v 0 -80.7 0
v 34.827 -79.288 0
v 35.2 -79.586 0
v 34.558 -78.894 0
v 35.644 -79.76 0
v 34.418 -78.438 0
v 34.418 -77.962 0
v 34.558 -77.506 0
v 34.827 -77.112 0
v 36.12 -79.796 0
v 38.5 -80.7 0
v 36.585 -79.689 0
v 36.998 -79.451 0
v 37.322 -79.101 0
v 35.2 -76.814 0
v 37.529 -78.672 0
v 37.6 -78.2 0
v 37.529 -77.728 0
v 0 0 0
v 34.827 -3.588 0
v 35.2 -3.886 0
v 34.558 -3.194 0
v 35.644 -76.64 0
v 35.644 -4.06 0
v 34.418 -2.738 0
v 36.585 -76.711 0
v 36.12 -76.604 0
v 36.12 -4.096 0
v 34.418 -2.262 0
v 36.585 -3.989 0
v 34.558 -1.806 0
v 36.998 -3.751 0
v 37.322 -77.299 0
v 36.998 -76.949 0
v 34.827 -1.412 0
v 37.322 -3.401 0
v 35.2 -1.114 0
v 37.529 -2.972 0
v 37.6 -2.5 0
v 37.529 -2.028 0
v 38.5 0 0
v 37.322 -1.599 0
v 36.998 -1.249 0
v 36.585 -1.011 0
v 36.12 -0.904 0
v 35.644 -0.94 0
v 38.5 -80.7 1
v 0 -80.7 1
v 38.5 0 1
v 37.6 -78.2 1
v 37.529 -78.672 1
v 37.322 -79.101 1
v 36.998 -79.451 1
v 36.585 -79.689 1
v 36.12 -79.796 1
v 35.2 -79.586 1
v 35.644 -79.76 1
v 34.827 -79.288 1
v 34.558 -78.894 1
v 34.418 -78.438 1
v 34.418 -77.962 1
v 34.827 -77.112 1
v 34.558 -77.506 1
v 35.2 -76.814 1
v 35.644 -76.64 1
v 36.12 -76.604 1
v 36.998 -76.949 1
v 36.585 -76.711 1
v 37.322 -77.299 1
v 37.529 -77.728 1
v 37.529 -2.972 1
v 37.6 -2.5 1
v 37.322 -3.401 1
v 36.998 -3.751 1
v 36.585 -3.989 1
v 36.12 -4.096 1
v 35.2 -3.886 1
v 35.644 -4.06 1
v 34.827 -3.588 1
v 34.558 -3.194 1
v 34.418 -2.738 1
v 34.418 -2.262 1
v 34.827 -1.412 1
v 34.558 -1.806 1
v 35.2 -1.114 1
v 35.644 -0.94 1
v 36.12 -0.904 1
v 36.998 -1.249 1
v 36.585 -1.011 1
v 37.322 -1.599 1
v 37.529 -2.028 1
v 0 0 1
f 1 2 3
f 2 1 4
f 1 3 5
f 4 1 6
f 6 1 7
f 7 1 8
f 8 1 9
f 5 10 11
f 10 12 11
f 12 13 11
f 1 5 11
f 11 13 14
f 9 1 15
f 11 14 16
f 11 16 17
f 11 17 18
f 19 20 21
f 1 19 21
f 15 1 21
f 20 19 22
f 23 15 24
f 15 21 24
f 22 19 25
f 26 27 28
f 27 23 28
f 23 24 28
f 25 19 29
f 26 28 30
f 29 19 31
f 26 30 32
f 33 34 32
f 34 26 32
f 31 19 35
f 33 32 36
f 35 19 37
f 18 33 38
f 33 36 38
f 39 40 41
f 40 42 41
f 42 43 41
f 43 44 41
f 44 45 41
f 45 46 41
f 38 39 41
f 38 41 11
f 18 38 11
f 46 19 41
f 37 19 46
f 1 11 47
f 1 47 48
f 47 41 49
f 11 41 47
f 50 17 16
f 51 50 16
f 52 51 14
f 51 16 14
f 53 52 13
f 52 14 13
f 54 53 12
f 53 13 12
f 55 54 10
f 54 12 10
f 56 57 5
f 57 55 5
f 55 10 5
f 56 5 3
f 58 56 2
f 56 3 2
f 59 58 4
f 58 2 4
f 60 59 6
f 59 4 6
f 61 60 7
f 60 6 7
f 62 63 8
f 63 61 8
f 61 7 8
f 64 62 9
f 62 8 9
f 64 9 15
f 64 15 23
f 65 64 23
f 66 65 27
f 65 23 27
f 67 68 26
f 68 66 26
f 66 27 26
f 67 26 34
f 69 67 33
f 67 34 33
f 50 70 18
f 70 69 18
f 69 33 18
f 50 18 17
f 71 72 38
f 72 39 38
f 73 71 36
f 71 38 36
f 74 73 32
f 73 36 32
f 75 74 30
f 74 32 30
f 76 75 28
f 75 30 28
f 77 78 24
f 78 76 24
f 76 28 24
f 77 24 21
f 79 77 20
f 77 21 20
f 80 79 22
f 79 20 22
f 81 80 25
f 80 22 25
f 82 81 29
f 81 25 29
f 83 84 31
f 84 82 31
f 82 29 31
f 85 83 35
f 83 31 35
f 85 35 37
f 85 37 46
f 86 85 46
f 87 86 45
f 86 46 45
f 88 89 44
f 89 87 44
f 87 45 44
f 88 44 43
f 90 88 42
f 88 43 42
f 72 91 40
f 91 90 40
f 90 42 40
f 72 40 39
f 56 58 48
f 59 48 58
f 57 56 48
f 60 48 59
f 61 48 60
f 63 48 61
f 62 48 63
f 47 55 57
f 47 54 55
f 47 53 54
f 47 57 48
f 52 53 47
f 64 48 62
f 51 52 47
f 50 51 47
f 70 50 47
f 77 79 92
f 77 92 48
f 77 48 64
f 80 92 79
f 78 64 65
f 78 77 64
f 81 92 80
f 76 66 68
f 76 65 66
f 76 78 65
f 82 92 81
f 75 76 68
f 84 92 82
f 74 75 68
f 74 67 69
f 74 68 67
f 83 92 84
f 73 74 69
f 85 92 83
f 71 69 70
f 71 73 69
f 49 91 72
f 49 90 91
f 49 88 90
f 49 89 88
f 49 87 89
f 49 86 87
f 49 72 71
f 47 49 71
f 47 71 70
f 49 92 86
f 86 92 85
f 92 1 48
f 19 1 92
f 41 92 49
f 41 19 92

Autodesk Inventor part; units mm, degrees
ref_plane "YZ Plane" through (0, 0, 0) normal (1, 0, 0) x (0, 1, 0)
ref_plane "XZ Plane" through (0, 0, 0) normal (0, 1, 0) x (-1, 0, 0)
ref_plane "XY Plane" through (0, 0, 0) normal (0, 0, 1) x (1, 0, 0)
sketch "Sketch1" plane through (0, 0, 0) normal (0, 0, 1) x (1, 0, 0)
  line L0 (0, 0) -> (38.5, 0)
  line L1 (38.5, 0) -> (38.5, -80.7)
  line L2 (38.5, -80.7) -> (0, -80.7)
  line L3 (0, -80.7) -> (0, 0)
  circle A0 centre (36, -2.5) radius 1.6
  circle A1 centre (36, -78.2) radius 1.6
  dimension "d0" = 38.5
  dimension "d1" = 80.7
  dimension "d4" = 3.2
  dimension "d7" = 3.2
extrude "Extrusion1" add sketch "Sketch1" along normal blind 1
sketch "Sketch2" plane through (0, 0, 0) normal (0, 0, -1) x (-1, 0, 0)
  line L0 (0, -80.7) -> (-38.5, -80.7) projected
  line L1 (0, 0) -> (0, -80.7) projected
  line L2 (-38.5, 0) -> (0, 0) projected
  line L3 (-38.5, -80.7) -> (-38.5, 0) projected
  circle A0 centre (-36, -78.2) radius 1.6 projected
  circle A1 centre (-36, -2.5) radius 1.6 projected
  line L4 (-26.0363, 0) -> (-26.0363, -34.7)
  dimension "d10" = 34.7
properties part number "alert"
